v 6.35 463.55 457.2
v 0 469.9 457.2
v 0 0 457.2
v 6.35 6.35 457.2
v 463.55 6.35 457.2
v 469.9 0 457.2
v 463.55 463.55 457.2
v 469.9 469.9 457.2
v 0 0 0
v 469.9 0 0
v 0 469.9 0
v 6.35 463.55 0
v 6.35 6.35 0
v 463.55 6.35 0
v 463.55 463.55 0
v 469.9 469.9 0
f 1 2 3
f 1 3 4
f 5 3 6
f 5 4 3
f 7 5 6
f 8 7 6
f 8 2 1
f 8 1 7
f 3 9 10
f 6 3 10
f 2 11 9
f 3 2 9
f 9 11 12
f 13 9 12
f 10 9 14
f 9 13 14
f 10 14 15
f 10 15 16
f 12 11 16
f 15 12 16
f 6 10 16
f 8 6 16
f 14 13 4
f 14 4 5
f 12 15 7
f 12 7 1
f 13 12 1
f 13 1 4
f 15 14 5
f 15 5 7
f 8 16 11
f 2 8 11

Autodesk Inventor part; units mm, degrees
ref_plane "YZ Plane" through (0, 0, 0) normal (1, 0, 0) x (0, 1, 0)
ref_plane "XZ Plane" through (0, 0, 0) normal (0, 1, 0) x (-1, 0, 0)
ref_plane "XY Plane" through (0, 0, 0) normal (0, 0, 1) x (1, 0, 0)
sketch "Sketch1" plane through (0, 0, 0) normal (0, 0, 1) x (1, 0, 0)
  line L0 (0, 0) -> (469.9, 0)
  line L1 (469.9, 0) -> (469.9, 469.9)
  line L2 (469.9, 469.9) -> (0, 469.9)
  line L3 (0, 469.9) -> (0, 0)
  dimension "d0" = 469.9
  dimension "d1" = 469.9
extrude "Extrusion1" add sketch "Sketch1" along normal blind 457.2
shell "Shell1" thickness 6.35 removed faces 2 at (156.6333, 313.2667, 0) at (156.6333, 313.2667, 457.2)
equation "\"d2\" = size"
equation "\"size\" = 457.2"
properties part number "Sizing Tool-01"
